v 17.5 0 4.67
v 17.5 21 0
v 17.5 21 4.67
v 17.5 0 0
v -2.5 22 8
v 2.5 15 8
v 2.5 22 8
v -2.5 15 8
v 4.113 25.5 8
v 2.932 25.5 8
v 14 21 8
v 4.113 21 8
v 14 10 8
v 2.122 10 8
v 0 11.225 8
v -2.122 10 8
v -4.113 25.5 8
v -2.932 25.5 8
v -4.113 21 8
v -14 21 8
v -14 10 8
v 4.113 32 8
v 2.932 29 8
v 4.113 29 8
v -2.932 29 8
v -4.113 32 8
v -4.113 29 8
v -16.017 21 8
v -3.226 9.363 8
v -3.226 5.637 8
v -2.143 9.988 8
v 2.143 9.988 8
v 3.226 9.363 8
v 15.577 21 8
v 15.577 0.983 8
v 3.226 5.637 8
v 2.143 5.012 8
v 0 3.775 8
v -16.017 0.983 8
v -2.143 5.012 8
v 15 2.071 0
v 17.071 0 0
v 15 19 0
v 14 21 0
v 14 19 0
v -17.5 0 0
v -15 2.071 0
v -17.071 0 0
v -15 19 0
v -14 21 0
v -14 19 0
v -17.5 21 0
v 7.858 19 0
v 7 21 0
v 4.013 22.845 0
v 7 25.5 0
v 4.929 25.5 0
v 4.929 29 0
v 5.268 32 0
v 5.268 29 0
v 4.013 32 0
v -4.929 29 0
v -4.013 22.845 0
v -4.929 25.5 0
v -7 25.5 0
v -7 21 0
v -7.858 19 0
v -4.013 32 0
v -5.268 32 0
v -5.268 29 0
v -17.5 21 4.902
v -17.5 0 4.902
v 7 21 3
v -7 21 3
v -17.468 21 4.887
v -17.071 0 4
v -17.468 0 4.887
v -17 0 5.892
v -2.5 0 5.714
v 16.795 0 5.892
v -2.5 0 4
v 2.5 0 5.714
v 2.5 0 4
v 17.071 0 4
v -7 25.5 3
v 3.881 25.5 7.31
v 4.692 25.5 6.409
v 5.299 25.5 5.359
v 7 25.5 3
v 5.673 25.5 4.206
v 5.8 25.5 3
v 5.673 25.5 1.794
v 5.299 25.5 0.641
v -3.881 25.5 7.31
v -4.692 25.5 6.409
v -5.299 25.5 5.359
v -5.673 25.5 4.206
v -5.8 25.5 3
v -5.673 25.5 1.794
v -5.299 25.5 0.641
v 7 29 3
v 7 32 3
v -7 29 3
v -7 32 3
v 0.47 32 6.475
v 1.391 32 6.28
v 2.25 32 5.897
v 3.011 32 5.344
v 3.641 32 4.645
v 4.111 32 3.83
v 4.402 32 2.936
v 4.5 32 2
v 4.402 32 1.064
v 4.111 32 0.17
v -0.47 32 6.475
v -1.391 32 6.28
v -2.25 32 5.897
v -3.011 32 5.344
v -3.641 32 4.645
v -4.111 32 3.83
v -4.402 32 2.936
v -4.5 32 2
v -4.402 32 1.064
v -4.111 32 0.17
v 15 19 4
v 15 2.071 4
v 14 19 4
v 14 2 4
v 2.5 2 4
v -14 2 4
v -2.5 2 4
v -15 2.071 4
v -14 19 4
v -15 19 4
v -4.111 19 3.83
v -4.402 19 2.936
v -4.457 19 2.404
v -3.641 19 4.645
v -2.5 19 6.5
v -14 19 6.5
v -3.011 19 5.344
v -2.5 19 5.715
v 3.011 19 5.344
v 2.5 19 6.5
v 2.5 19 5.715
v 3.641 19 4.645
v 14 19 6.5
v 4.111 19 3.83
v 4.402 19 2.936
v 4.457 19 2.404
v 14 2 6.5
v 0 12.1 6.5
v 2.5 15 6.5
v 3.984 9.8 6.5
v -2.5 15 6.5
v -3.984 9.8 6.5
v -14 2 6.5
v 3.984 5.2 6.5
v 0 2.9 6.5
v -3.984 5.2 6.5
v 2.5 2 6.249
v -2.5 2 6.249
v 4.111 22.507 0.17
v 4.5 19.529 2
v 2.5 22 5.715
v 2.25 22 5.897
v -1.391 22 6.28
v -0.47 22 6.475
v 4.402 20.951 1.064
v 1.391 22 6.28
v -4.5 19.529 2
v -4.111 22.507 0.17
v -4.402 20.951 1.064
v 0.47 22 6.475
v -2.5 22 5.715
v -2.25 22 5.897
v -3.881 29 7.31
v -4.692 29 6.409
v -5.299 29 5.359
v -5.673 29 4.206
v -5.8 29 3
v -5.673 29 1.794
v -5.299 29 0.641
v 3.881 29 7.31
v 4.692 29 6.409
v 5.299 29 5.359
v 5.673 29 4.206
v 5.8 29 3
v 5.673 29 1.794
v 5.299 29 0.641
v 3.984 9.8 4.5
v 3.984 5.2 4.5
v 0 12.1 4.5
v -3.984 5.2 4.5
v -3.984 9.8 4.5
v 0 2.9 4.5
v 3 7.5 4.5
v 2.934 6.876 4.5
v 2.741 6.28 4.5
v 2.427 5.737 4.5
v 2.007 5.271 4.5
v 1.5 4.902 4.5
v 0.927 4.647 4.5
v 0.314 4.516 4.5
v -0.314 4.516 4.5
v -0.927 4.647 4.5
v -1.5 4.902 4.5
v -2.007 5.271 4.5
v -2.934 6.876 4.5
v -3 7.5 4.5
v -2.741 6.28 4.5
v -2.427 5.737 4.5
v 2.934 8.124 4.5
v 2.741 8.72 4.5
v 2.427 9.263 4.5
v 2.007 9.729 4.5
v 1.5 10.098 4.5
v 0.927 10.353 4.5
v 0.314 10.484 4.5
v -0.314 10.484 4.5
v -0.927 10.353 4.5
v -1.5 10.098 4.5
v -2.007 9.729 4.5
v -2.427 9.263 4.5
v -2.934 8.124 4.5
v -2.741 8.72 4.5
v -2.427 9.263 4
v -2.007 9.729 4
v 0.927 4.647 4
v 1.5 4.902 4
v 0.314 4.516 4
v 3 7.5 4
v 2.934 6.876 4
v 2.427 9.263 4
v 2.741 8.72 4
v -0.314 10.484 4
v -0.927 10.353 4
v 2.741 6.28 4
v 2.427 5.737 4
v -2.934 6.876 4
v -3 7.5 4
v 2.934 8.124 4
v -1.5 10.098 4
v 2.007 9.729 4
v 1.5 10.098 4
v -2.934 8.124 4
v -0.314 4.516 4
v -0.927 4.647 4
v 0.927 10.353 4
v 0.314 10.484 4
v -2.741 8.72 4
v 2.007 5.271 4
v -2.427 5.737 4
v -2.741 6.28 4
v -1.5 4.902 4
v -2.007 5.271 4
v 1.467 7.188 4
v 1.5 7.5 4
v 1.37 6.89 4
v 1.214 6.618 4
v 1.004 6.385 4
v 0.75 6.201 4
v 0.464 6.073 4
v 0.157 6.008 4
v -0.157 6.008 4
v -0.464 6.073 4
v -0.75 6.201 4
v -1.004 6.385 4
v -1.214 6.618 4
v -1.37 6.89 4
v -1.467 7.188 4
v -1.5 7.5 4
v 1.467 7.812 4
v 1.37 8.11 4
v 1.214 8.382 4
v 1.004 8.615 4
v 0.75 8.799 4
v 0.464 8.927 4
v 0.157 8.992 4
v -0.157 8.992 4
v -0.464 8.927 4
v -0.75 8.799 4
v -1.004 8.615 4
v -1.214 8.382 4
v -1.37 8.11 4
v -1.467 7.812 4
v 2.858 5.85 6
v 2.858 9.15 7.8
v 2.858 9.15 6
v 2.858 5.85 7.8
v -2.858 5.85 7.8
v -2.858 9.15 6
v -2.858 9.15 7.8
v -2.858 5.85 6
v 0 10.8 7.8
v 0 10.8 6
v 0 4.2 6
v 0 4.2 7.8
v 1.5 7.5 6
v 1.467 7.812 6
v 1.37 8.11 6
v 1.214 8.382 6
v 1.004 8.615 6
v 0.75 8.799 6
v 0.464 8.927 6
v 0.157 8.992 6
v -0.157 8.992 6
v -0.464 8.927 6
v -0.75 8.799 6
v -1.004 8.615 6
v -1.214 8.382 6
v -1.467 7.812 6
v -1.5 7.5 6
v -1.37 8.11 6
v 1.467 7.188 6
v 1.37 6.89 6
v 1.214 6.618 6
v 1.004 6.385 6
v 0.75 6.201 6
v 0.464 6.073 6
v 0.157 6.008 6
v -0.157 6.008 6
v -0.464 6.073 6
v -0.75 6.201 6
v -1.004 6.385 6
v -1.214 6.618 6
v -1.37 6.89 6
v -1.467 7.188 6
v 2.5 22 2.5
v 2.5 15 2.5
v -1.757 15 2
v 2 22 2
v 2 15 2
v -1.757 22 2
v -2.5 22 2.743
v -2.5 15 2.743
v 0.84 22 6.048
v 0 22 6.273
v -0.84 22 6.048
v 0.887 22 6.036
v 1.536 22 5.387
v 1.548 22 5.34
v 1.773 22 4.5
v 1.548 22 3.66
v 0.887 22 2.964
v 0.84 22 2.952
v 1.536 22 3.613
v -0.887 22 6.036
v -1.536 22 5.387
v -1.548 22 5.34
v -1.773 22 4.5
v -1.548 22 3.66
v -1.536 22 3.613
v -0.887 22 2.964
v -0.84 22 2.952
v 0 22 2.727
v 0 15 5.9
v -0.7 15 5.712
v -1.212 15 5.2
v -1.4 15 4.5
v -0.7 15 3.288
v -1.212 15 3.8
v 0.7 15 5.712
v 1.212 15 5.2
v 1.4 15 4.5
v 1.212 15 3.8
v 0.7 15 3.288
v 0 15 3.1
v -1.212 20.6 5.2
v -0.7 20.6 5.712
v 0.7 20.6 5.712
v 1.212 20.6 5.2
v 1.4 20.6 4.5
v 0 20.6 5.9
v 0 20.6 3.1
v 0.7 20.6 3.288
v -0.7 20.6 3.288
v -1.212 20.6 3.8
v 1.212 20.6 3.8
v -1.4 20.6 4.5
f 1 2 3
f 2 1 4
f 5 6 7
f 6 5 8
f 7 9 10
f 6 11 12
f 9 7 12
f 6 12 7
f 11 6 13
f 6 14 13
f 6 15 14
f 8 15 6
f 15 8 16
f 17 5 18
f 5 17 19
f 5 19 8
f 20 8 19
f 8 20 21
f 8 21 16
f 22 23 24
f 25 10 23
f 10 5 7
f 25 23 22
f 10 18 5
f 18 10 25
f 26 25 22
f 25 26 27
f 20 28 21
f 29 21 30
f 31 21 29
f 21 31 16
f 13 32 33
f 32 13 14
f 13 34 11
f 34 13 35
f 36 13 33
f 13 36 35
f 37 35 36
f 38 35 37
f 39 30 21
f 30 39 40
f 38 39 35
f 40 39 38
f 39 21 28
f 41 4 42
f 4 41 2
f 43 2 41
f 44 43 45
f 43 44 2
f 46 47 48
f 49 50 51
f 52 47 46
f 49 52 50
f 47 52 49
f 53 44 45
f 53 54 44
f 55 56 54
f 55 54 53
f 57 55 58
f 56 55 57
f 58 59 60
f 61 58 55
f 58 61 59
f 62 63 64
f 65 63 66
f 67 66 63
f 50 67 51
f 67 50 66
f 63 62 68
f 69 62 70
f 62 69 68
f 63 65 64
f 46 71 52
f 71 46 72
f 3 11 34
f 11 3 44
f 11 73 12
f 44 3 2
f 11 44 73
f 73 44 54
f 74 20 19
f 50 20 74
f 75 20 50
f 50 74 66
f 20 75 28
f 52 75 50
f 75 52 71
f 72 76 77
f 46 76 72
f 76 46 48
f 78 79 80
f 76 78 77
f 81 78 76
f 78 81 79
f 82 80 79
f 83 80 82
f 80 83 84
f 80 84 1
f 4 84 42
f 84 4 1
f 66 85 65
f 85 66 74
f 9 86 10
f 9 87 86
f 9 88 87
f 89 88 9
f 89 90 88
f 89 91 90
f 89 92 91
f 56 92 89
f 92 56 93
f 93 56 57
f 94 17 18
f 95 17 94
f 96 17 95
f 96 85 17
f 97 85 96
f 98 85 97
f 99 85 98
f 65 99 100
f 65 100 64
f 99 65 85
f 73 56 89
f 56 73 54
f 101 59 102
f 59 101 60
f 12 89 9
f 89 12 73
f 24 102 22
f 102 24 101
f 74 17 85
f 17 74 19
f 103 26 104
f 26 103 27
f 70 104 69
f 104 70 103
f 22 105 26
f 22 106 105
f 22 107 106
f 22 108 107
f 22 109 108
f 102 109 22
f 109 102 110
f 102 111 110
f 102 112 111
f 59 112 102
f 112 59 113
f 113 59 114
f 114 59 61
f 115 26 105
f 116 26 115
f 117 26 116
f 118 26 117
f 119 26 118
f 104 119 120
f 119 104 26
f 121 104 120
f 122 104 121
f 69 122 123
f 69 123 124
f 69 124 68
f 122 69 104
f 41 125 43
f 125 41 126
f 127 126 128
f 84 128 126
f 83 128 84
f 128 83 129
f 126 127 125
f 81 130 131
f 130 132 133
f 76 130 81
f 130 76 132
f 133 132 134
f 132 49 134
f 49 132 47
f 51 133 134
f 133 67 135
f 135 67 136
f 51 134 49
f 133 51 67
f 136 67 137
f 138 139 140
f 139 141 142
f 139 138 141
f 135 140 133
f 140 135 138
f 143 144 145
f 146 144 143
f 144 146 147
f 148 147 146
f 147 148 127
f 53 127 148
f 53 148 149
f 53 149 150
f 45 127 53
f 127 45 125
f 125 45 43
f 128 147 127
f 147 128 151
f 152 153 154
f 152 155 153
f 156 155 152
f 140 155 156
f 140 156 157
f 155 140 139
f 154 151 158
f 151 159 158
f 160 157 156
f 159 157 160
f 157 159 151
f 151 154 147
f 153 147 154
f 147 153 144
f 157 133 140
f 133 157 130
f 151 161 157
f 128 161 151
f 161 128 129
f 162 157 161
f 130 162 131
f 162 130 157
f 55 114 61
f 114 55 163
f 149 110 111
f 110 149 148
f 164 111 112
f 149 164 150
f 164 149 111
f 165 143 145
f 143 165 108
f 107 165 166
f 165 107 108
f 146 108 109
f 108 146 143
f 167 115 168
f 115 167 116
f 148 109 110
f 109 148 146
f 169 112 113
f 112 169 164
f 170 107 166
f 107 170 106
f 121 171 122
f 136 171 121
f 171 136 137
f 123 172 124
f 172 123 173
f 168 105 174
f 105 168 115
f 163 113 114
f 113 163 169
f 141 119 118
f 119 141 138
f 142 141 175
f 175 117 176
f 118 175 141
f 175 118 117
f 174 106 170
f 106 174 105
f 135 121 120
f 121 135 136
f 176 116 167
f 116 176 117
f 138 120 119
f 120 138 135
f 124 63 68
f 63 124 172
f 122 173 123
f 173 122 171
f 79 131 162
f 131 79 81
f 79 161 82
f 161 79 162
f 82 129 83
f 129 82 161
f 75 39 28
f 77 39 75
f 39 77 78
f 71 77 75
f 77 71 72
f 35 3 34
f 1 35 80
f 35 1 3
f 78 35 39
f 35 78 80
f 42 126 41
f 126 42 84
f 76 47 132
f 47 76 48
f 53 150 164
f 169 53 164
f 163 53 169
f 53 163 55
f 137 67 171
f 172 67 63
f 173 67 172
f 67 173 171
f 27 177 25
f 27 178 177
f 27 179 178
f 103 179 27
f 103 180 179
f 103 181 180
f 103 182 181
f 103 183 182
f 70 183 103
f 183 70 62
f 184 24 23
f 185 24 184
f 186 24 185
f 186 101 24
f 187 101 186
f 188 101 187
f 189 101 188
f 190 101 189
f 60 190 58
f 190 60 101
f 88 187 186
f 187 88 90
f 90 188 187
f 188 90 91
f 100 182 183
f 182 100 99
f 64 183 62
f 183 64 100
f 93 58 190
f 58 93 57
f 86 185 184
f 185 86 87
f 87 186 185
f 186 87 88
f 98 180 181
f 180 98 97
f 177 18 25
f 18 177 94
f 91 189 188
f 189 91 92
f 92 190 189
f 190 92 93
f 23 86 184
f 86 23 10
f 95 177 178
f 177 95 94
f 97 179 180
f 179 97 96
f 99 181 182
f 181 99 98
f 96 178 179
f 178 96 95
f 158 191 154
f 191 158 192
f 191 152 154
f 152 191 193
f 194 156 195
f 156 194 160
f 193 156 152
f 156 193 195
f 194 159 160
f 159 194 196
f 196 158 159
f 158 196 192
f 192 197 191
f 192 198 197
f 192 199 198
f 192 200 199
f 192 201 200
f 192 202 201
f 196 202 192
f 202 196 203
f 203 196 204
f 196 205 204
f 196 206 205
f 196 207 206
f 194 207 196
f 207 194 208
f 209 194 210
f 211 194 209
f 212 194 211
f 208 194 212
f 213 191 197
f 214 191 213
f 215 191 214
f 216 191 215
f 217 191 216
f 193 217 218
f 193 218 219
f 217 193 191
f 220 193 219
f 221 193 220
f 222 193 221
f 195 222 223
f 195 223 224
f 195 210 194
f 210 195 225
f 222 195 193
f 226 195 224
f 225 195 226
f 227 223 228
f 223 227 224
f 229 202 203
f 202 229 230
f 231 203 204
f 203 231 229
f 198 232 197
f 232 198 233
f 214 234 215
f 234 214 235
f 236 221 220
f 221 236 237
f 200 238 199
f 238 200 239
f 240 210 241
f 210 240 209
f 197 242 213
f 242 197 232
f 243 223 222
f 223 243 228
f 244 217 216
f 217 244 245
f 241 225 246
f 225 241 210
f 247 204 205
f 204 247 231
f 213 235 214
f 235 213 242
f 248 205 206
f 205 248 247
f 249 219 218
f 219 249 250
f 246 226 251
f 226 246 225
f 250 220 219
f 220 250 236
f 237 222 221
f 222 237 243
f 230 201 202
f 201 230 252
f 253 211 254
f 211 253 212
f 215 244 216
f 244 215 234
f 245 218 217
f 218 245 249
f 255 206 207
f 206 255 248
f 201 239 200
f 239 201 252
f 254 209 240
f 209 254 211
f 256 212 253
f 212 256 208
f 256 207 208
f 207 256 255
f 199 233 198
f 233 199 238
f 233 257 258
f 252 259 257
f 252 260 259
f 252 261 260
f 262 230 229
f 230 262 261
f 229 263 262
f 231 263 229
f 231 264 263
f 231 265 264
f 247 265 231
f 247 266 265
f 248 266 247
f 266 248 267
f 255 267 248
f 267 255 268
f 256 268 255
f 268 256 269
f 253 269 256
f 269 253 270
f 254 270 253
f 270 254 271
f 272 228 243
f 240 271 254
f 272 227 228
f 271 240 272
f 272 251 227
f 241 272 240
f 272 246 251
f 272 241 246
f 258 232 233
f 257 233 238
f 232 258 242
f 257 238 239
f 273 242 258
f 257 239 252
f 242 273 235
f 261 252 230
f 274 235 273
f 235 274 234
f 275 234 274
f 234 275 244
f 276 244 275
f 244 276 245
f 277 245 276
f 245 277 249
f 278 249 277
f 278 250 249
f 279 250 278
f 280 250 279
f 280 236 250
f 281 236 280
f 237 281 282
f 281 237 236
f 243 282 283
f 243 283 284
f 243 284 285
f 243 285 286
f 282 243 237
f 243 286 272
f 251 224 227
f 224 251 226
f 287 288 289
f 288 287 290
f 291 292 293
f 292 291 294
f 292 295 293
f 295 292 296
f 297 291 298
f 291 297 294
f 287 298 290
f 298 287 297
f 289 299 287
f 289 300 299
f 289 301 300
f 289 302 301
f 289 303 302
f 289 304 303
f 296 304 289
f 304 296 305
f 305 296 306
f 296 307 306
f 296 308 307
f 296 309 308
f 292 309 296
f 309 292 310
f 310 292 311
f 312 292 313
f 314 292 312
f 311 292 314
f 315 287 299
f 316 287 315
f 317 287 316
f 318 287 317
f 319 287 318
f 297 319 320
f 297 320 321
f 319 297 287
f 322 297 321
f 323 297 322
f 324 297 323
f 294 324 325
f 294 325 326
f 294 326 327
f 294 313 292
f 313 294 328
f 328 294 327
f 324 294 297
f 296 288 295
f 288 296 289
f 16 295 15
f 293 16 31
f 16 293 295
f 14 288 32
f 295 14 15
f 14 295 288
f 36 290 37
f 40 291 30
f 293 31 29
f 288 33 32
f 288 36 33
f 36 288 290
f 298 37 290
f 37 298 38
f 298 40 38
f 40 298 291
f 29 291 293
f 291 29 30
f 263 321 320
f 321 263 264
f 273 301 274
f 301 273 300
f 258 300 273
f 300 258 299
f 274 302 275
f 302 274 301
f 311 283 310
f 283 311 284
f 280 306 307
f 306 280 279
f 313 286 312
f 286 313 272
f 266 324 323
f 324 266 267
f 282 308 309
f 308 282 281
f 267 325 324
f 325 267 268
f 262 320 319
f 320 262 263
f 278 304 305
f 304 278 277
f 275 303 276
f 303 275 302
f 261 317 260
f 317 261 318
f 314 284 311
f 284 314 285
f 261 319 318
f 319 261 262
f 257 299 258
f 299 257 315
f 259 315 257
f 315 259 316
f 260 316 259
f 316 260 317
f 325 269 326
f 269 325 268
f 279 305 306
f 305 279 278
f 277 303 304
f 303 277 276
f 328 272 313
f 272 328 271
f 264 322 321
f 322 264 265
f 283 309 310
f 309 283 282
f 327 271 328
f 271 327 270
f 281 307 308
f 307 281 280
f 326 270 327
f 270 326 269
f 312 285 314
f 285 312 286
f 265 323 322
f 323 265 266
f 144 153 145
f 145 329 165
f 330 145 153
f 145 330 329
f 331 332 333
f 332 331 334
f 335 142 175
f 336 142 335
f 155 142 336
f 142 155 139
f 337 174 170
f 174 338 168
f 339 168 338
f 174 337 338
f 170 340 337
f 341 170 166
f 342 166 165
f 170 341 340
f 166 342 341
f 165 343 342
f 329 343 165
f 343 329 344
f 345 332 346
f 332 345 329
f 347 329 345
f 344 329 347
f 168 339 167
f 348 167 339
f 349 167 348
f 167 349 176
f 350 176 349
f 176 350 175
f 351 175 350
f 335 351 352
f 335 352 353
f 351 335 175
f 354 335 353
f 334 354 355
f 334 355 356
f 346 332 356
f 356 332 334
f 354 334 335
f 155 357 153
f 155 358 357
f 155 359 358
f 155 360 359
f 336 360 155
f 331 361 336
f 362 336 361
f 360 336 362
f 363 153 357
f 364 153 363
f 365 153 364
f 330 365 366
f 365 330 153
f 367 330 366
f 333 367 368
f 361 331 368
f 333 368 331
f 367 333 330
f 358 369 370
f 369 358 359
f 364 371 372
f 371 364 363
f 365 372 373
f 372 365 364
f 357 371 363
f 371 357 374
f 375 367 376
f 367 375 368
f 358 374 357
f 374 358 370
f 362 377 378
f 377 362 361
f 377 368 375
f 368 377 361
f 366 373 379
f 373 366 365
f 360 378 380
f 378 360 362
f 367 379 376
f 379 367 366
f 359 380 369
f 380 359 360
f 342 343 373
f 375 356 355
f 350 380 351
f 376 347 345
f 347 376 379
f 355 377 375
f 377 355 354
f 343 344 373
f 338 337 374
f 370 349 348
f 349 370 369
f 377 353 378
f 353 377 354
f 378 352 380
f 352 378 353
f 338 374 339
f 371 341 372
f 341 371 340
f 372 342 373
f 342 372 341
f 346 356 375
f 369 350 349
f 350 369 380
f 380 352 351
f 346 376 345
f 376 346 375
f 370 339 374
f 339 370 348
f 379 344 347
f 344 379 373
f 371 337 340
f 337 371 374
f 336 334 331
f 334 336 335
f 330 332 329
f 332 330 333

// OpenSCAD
module cover()
{
    translate([ -17.5, 0, 0 ]) cube([ 35, 21, 8 ]);  // cover
    translate([ -7, 19, 0 ]) cube([ 3, 6.5, 3 ]);  // tube reinforcement
    translate([ 4, 19, 0 ]) cube([ 3, 6.5, 3 ]);  // tube reinforcement
    translate( [ 0 , 32 , 3 ] ) rotate( [90,0,0] ) cylinder( h = 12, r = 7, $fn=6);  // cable tube outer
}

module inside_cut(){
    translate([ -15, -1, -1 ]) cube( [30,20,5] );     // inside cut
    translate([ -14, 2, 4 ])  cube( [28,17,2.5 ] );     // inside cut
    
    translate( [ 0 , 32 , 2 ] ) rotate( [90,0,0] ) cylinder( h = 16, r = 4.5, $fn=30);  // cable tube inner
    
    translate([ -14, 10, -5 ])  cube( [28,25,5 ] );     // inside cut
    translate([ -14, 10, 8 ])  cube( [28,25,3 ] );     // inside cut
    
    translate([ -2.5, -6, 1 ])  rotate([15,0,0]) cube( [5,10,3 ] );     // LED
    
    translate([ -22, -5, 7 ]) rotate([0,25,0])  cube( [5,40,6 ] );     // corners
    translate([ 15, -5, 9 ]) rotate([0,60,0])  cube( [6,40,5 ] );     // corners
    translate([ 20, -5, 7 ]) rotate([0,25,90])  cube( [5,40,5 ] );     // corners
    
    translate([ 15, -5, -1 ]) rotate([0,0,45])  cube( [5,5,5 ] );     // corners
    translate([ -15, -5, -1 ]) rotate([0,0,45])  cube( [5,5,5 ] );     // corners
    
    
    translate([ 8, 13, -10]) rotate([0,-45,45])  cube( [10,10,10 ] );     // corners
    translate([ -8, 13, -10]) rotate([0,-45,-45])  cube( [10,10,10 ] );     // corners

    }

    module ziptie(){
        difference(){
        translate( [ 0 , 29 , 3 ] ) rotate( [90,0,0] ) cylinder( h = 3.5, r = 10, $fn=30);  // cable tube outer
        translate( [ 0 , 29 , 3 ] ) rotate( [90,0,0] ) cylinder( h = 3.5, r = 5.8, $fn=30);  // cable tube outer
        }
        }

    module filament_holder(){
        difference(){
        translate([ -2.5,15, 2 ]) rotate([0,0,0])  cube( [5,7,6 ] );     // body
        translate( [ 0 , 24 , 4.5 ] ) rotate( [90,0,0] ) cylinder( h = 10, r = 1.4, $fn=12);  // filament
        translate( [ 0 , 22.1 , 4.5 ] ) rotate( [90,0,0] ) cylinder( h = 1.5, r1 = 1.8, r2=1.4, $fn=12);  // filament

        translate([ -5,15, 1 ]) rotate([0,45,0])  cube( [3,15,3 ] );     // corners            
        translate([ 1,15, 1 ]) rotate([0,45,0])  cube( [3,15,3 ] );     // corners
        }
    }
    module m3_screw(){
        
    translate( [ 0 , 7.5 , 6 ] ) rotate( [0,0,90] ) cylinder( h = 2.5, r = 3.3, $fn=6);  // M3 HEAD
    translate( [ 0 , 7.5 , 7.8] ) rotate( [0,0,90] ) cylinder( h = 0.8, r1 = 3.3, r2=5, $fn=6);  // M3 HEAD
    translate( [ 0 , 7.5 , -10 ] ) rotate( [0,0,0] ) cylinder( h = 20, r = 1.5, $fn=30);  // M3 thread
    }
    
    module nut_trap(){
    translate( [ 0 , 7.5 , 4.5 ] ) rotate( [0,0,90] ) cylinder( h = 2.5, r = 4.6, $fn=6);  // M3 HEAD
    translate( [ 0 , 7.5 , 4 ] ) rotate( [0,0,0] ) cylinder( h = 1, r = 3, $fn=30);      
    }
    
    difference(){
    union(){
        difference(){
        cover();
        inside_cut();
            ziptie();
        }
        nut_trap();
    }   
    m3_screw();
    }
    
    filament_holder();
    
